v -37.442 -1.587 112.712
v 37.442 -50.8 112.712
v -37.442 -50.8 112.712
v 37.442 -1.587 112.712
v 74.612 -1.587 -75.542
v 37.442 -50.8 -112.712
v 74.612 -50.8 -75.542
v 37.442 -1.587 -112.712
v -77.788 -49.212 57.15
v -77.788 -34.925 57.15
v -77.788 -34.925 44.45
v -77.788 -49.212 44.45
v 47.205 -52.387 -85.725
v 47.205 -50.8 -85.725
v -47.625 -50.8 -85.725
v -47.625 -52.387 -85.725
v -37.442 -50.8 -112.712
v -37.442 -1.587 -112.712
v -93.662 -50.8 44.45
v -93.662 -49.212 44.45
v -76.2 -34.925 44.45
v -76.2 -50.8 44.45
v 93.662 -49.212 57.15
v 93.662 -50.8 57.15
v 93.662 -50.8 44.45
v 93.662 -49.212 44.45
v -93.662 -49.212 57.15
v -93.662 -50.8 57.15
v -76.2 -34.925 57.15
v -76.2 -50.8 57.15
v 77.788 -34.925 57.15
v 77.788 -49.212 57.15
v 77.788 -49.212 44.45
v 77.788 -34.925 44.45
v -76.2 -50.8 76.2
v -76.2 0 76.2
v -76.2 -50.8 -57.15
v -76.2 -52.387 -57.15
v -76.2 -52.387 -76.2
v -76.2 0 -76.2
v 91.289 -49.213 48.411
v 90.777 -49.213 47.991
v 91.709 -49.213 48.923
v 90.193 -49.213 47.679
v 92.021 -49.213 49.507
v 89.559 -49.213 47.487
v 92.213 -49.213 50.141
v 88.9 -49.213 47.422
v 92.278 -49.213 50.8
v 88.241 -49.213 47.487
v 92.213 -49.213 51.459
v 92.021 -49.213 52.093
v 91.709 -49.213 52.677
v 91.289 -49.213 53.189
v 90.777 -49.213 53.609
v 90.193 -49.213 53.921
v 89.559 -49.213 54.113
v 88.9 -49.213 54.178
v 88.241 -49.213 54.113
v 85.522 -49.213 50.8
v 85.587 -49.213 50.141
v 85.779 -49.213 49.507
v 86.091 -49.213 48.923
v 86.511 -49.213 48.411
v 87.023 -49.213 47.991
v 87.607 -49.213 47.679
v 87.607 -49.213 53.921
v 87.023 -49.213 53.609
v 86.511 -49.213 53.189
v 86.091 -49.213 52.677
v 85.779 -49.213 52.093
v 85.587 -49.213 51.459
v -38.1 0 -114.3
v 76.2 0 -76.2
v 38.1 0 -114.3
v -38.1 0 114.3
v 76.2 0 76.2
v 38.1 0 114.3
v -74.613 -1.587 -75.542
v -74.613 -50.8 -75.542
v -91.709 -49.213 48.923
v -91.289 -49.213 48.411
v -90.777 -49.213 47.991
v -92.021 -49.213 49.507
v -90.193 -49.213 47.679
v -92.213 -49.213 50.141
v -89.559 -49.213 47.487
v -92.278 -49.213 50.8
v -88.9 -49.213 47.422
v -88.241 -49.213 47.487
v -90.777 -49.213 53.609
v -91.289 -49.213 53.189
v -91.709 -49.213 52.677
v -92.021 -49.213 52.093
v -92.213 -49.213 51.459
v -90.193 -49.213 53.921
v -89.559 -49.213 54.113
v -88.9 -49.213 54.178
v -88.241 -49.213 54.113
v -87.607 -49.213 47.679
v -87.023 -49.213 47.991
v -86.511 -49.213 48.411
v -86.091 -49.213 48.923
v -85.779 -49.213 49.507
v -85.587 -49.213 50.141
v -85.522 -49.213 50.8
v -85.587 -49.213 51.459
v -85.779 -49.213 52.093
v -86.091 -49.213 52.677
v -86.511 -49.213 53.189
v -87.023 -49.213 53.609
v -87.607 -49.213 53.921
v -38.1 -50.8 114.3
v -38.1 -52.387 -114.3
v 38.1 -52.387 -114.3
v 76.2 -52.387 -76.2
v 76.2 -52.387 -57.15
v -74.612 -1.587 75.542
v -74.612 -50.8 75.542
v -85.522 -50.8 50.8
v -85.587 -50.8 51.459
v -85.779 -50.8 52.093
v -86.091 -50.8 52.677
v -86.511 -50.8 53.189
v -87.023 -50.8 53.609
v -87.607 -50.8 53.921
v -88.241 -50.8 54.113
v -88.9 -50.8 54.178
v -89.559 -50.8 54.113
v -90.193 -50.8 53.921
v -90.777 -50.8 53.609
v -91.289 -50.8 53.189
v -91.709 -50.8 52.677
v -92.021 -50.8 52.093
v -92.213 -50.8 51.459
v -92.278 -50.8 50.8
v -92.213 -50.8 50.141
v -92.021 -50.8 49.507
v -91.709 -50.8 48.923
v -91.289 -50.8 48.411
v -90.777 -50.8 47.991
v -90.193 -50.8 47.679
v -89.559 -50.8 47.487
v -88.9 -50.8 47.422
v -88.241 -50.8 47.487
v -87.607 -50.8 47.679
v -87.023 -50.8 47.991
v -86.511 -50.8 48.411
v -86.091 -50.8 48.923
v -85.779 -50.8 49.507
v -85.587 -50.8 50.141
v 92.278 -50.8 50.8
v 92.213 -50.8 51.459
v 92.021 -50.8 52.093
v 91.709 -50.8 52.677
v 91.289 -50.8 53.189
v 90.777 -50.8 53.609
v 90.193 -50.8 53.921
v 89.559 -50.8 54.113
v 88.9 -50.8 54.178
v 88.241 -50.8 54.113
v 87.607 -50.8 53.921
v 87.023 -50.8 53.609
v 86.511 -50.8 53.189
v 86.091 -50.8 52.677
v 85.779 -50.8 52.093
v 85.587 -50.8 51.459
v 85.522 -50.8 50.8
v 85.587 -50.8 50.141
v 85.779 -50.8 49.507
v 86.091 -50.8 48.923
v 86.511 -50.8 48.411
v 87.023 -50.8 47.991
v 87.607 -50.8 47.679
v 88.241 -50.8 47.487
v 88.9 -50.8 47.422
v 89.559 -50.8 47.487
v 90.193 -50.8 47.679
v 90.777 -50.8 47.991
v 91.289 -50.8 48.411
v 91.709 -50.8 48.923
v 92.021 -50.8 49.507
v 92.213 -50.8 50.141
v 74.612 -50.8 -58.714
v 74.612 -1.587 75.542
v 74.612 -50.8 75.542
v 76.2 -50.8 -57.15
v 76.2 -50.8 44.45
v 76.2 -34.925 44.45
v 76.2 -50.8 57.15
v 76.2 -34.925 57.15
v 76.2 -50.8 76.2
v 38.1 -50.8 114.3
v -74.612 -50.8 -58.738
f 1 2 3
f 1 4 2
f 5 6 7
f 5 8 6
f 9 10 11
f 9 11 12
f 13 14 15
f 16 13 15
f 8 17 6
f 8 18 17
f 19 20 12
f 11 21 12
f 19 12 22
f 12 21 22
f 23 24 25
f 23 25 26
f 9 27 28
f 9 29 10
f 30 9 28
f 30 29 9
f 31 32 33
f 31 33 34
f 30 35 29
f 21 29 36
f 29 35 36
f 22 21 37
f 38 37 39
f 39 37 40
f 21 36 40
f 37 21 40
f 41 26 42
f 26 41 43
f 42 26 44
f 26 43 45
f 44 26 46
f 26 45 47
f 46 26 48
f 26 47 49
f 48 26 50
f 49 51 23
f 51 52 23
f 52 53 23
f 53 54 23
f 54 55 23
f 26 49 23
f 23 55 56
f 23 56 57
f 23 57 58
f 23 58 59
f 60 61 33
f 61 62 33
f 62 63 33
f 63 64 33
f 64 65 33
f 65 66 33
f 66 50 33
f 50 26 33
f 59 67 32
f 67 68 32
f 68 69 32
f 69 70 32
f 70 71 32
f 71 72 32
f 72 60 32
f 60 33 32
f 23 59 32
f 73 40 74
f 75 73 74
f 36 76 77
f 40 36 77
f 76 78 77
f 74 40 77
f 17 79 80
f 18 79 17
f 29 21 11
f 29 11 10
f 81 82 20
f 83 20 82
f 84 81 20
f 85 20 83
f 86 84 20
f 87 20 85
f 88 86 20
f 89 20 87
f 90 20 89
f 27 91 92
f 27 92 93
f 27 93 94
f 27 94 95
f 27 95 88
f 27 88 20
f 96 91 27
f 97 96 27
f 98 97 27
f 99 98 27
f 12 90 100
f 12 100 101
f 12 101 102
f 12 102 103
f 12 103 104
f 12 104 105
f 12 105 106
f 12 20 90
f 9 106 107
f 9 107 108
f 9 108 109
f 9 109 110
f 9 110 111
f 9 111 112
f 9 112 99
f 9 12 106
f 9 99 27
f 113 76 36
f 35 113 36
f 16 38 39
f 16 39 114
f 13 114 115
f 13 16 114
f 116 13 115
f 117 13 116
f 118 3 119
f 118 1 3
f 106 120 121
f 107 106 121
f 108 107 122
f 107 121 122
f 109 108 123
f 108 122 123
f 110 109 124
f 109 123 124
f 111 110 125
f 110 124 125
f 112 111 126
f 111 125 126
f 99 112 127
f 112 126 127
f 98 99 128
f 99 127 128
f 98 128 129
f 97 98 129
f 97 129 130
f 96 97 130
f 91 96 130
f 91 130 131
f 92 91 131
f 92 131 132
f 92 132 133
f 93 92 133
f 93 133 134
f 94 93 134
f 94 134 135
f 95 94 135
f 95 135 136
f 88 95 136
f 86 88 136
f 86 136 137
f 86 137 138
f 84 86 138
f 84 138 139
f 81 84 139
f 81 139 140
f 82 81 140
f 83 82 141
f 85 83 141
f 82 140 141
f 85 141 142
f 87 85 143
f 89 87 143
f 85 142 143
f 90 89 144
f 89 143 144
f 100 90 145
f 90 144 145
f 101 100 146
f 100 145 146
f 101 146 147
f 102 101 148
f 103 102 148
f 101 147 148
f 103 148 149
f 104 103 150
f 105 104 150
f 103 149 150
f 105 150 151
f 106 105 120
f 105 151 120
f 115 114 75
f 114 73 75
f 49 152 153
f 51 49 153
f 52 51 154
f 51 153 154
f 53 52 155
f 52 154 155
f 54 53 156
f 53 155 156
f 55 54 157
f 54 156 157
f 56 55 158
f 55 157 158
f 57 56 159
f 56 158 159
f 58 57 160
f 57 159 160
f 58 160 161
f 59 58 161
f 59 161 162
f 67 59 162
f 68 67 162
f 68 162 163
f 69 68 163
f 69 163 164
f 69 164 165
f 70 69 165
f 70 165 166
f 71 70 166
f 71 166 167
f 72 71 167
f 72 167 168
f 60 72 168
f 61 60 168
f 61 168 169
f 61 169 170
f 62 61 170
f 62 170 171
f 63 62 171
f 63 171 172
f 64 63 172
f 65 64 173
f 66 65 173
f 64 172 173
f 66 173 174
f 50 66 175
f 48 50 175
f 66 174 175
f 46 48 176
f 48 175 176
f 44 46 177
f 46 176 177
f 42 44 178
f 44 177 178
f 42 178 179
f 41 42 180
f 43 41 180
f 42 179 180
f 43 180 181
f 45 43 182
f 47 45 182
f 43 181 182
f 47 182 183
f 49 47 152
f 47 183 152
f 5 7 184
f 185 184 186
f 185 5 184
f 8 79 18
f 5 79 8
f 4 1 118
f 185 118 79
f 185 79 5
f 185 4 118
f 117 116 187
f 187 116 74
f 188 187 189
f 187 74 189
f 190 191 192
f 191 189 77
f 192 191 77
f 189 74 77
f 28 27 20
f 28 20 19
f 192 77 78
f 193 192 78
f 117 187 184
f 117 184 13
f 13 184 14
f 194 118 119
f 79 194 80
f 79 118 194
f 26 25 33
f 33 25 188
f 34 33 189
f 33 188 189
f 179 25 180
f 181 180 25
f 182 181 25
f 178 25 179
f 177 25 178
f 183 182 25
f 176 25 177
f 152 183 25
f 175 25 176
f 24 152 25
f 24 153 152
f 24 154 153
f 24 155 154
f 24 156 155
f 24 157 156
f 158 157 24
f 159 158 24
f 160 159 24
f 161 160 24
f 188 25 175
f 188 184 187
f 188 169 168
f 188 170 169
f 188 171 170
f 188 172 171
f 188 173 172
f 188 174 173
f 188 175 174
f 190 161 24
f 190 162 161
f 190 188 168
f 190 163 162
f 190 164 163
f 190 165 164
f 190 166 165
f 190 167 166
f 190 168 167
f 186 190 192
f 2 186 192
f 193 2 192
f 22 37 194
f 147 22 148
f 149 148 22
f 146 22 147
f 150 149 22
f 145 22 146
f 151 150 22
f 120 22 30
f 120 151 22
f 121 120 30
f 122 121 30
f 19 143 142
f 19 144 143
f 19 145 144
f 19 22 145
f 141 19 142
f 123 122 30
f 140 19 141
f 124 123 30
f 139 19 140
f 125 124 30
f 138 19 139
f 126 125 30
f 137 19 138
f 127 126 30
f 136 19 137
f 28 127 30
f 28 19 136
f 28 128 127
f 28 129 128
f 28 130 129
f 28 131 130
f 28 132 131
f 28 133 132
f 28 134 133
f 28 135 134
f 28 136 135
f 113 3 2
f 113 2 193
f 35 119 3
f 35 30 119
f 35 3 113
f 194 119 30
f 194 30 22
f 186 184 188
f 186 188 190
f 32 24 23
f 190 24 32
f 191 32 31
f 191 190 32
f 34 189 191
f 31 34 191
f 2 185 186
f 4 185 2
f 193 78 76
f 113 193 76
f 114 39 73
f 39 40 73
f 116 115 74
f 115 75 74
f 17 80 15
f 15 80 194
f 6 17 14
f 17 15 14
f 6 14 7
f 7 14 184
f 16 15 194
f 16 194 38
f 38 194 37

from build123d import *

# Parameters (mm, degrees)
F1_DEPTH  = 50.8
F2_T      = -1.5875
F4_DEPTH  = 1.5875
F5_W      = 15.875
F5_H      = 12.7
F6_DEPTH  = 1.5875
F7_W      = 1.5875
F7_H      = 12.7
F8_DEPTH  = 15.875
F10_D     = 6.7564
F11_W     = 15.875
F11_H     = 12.7
F12_DEPTH = 1.5875
F13_W     = 1.5875
F13_H     = 12.7
F14_DEPTH = 15.875
F16_D     = 6.7564


with BuildPart() as f1:
    # F0 (on Front) → F1 (new body)
    with BuildSketch(Plane.XZ):
        Polygon((-38.1, 114.3), (-76.2, 76.2), (-76.2, -76.2), (-38.1, -114.3), (0, -114.3), (38.1, -114.3), (76.2, -76.2), (76.2, 76.2), (38.1, 114.3), (0, 114.3), align=None)
    extrude(amount=F1_DEPTH)

    # F2
    f2_openings = [f1.faces().sort_by_distance(p)[0] for p in [
        (0, -50.8, 0),
    ]]
    offset(amount=F2_T, openings=f2_openings)

    # F3 (on face) → F4 (join)
    with BuildSketch(Plane.XZ.offset(50.8)):
        Polygon((-47.625, -85.725), (-76.2, -57.15), (-76.2, -76.2), (-38.1, -114.3), (38.1, -114.3), (76.2, -76.2), (76.2, -57.15), (47.204726897, -85.725), align=None)
    extrude(amount=F4_DEPTH)

    # F5 (on face) → F6 (join)
    with BuildSketch(Plane(origin=(-76.2, 0, 0), x_dir=(0, -1, 0), z_dir=(-1, 0, 0))):
        with Locations((42.8625, 50.8)):
            Rectangle(F5_W, F5_H)
    extrude(amount=F6_DEPTH)

    # F7 (on face) → F8 (join)
    with BuildSketch(Plane(origin=(-77.7875, 0, 0), x_dir=(0, -1, 0), z_dir=(-1, 0, 0))):
        with Locations((50.00625, 50.8)):
            Rectangle(F7_W, F7_H)
    extrude(amount=F8_DEPTH)

    # F10 (through all)
    with Locations(Plane(origin=(0, -49.2125, 0), x_dir=(-1, 0, 0), z_dir=(0, 1, 0))):
        with Locations((88.9, 50.8)):
            Hole(F10_D / 2)

    # F11 (on face) → F12 (join)
    with BuildSketch(Plane.YZ.offset(76.2)):
        with Locations((-42.8625, 50.8)):
            Rectangle(F11_W, F11_H)
    extrude(amount=F12_DEPTH)

    # F13 (on face) → F14 (join)
    with BuildSketch(Plane.YZ.offset(77.7875)):
        with Locations((-50.00625, 50.8)):
            Rectangle(F13_W, F13_H)
    extrude(amount=F14_DEPTH)

    # F16 (through all)
    with Locations(Plane(origin=(0, -49.2125, 0), x_dir=(-1, 0, 0), z_dir=(0, 1, 0))):
        with Locations((-88.9, 50.8)):
            Hole(F16_D / 2)


solid = f1.part
